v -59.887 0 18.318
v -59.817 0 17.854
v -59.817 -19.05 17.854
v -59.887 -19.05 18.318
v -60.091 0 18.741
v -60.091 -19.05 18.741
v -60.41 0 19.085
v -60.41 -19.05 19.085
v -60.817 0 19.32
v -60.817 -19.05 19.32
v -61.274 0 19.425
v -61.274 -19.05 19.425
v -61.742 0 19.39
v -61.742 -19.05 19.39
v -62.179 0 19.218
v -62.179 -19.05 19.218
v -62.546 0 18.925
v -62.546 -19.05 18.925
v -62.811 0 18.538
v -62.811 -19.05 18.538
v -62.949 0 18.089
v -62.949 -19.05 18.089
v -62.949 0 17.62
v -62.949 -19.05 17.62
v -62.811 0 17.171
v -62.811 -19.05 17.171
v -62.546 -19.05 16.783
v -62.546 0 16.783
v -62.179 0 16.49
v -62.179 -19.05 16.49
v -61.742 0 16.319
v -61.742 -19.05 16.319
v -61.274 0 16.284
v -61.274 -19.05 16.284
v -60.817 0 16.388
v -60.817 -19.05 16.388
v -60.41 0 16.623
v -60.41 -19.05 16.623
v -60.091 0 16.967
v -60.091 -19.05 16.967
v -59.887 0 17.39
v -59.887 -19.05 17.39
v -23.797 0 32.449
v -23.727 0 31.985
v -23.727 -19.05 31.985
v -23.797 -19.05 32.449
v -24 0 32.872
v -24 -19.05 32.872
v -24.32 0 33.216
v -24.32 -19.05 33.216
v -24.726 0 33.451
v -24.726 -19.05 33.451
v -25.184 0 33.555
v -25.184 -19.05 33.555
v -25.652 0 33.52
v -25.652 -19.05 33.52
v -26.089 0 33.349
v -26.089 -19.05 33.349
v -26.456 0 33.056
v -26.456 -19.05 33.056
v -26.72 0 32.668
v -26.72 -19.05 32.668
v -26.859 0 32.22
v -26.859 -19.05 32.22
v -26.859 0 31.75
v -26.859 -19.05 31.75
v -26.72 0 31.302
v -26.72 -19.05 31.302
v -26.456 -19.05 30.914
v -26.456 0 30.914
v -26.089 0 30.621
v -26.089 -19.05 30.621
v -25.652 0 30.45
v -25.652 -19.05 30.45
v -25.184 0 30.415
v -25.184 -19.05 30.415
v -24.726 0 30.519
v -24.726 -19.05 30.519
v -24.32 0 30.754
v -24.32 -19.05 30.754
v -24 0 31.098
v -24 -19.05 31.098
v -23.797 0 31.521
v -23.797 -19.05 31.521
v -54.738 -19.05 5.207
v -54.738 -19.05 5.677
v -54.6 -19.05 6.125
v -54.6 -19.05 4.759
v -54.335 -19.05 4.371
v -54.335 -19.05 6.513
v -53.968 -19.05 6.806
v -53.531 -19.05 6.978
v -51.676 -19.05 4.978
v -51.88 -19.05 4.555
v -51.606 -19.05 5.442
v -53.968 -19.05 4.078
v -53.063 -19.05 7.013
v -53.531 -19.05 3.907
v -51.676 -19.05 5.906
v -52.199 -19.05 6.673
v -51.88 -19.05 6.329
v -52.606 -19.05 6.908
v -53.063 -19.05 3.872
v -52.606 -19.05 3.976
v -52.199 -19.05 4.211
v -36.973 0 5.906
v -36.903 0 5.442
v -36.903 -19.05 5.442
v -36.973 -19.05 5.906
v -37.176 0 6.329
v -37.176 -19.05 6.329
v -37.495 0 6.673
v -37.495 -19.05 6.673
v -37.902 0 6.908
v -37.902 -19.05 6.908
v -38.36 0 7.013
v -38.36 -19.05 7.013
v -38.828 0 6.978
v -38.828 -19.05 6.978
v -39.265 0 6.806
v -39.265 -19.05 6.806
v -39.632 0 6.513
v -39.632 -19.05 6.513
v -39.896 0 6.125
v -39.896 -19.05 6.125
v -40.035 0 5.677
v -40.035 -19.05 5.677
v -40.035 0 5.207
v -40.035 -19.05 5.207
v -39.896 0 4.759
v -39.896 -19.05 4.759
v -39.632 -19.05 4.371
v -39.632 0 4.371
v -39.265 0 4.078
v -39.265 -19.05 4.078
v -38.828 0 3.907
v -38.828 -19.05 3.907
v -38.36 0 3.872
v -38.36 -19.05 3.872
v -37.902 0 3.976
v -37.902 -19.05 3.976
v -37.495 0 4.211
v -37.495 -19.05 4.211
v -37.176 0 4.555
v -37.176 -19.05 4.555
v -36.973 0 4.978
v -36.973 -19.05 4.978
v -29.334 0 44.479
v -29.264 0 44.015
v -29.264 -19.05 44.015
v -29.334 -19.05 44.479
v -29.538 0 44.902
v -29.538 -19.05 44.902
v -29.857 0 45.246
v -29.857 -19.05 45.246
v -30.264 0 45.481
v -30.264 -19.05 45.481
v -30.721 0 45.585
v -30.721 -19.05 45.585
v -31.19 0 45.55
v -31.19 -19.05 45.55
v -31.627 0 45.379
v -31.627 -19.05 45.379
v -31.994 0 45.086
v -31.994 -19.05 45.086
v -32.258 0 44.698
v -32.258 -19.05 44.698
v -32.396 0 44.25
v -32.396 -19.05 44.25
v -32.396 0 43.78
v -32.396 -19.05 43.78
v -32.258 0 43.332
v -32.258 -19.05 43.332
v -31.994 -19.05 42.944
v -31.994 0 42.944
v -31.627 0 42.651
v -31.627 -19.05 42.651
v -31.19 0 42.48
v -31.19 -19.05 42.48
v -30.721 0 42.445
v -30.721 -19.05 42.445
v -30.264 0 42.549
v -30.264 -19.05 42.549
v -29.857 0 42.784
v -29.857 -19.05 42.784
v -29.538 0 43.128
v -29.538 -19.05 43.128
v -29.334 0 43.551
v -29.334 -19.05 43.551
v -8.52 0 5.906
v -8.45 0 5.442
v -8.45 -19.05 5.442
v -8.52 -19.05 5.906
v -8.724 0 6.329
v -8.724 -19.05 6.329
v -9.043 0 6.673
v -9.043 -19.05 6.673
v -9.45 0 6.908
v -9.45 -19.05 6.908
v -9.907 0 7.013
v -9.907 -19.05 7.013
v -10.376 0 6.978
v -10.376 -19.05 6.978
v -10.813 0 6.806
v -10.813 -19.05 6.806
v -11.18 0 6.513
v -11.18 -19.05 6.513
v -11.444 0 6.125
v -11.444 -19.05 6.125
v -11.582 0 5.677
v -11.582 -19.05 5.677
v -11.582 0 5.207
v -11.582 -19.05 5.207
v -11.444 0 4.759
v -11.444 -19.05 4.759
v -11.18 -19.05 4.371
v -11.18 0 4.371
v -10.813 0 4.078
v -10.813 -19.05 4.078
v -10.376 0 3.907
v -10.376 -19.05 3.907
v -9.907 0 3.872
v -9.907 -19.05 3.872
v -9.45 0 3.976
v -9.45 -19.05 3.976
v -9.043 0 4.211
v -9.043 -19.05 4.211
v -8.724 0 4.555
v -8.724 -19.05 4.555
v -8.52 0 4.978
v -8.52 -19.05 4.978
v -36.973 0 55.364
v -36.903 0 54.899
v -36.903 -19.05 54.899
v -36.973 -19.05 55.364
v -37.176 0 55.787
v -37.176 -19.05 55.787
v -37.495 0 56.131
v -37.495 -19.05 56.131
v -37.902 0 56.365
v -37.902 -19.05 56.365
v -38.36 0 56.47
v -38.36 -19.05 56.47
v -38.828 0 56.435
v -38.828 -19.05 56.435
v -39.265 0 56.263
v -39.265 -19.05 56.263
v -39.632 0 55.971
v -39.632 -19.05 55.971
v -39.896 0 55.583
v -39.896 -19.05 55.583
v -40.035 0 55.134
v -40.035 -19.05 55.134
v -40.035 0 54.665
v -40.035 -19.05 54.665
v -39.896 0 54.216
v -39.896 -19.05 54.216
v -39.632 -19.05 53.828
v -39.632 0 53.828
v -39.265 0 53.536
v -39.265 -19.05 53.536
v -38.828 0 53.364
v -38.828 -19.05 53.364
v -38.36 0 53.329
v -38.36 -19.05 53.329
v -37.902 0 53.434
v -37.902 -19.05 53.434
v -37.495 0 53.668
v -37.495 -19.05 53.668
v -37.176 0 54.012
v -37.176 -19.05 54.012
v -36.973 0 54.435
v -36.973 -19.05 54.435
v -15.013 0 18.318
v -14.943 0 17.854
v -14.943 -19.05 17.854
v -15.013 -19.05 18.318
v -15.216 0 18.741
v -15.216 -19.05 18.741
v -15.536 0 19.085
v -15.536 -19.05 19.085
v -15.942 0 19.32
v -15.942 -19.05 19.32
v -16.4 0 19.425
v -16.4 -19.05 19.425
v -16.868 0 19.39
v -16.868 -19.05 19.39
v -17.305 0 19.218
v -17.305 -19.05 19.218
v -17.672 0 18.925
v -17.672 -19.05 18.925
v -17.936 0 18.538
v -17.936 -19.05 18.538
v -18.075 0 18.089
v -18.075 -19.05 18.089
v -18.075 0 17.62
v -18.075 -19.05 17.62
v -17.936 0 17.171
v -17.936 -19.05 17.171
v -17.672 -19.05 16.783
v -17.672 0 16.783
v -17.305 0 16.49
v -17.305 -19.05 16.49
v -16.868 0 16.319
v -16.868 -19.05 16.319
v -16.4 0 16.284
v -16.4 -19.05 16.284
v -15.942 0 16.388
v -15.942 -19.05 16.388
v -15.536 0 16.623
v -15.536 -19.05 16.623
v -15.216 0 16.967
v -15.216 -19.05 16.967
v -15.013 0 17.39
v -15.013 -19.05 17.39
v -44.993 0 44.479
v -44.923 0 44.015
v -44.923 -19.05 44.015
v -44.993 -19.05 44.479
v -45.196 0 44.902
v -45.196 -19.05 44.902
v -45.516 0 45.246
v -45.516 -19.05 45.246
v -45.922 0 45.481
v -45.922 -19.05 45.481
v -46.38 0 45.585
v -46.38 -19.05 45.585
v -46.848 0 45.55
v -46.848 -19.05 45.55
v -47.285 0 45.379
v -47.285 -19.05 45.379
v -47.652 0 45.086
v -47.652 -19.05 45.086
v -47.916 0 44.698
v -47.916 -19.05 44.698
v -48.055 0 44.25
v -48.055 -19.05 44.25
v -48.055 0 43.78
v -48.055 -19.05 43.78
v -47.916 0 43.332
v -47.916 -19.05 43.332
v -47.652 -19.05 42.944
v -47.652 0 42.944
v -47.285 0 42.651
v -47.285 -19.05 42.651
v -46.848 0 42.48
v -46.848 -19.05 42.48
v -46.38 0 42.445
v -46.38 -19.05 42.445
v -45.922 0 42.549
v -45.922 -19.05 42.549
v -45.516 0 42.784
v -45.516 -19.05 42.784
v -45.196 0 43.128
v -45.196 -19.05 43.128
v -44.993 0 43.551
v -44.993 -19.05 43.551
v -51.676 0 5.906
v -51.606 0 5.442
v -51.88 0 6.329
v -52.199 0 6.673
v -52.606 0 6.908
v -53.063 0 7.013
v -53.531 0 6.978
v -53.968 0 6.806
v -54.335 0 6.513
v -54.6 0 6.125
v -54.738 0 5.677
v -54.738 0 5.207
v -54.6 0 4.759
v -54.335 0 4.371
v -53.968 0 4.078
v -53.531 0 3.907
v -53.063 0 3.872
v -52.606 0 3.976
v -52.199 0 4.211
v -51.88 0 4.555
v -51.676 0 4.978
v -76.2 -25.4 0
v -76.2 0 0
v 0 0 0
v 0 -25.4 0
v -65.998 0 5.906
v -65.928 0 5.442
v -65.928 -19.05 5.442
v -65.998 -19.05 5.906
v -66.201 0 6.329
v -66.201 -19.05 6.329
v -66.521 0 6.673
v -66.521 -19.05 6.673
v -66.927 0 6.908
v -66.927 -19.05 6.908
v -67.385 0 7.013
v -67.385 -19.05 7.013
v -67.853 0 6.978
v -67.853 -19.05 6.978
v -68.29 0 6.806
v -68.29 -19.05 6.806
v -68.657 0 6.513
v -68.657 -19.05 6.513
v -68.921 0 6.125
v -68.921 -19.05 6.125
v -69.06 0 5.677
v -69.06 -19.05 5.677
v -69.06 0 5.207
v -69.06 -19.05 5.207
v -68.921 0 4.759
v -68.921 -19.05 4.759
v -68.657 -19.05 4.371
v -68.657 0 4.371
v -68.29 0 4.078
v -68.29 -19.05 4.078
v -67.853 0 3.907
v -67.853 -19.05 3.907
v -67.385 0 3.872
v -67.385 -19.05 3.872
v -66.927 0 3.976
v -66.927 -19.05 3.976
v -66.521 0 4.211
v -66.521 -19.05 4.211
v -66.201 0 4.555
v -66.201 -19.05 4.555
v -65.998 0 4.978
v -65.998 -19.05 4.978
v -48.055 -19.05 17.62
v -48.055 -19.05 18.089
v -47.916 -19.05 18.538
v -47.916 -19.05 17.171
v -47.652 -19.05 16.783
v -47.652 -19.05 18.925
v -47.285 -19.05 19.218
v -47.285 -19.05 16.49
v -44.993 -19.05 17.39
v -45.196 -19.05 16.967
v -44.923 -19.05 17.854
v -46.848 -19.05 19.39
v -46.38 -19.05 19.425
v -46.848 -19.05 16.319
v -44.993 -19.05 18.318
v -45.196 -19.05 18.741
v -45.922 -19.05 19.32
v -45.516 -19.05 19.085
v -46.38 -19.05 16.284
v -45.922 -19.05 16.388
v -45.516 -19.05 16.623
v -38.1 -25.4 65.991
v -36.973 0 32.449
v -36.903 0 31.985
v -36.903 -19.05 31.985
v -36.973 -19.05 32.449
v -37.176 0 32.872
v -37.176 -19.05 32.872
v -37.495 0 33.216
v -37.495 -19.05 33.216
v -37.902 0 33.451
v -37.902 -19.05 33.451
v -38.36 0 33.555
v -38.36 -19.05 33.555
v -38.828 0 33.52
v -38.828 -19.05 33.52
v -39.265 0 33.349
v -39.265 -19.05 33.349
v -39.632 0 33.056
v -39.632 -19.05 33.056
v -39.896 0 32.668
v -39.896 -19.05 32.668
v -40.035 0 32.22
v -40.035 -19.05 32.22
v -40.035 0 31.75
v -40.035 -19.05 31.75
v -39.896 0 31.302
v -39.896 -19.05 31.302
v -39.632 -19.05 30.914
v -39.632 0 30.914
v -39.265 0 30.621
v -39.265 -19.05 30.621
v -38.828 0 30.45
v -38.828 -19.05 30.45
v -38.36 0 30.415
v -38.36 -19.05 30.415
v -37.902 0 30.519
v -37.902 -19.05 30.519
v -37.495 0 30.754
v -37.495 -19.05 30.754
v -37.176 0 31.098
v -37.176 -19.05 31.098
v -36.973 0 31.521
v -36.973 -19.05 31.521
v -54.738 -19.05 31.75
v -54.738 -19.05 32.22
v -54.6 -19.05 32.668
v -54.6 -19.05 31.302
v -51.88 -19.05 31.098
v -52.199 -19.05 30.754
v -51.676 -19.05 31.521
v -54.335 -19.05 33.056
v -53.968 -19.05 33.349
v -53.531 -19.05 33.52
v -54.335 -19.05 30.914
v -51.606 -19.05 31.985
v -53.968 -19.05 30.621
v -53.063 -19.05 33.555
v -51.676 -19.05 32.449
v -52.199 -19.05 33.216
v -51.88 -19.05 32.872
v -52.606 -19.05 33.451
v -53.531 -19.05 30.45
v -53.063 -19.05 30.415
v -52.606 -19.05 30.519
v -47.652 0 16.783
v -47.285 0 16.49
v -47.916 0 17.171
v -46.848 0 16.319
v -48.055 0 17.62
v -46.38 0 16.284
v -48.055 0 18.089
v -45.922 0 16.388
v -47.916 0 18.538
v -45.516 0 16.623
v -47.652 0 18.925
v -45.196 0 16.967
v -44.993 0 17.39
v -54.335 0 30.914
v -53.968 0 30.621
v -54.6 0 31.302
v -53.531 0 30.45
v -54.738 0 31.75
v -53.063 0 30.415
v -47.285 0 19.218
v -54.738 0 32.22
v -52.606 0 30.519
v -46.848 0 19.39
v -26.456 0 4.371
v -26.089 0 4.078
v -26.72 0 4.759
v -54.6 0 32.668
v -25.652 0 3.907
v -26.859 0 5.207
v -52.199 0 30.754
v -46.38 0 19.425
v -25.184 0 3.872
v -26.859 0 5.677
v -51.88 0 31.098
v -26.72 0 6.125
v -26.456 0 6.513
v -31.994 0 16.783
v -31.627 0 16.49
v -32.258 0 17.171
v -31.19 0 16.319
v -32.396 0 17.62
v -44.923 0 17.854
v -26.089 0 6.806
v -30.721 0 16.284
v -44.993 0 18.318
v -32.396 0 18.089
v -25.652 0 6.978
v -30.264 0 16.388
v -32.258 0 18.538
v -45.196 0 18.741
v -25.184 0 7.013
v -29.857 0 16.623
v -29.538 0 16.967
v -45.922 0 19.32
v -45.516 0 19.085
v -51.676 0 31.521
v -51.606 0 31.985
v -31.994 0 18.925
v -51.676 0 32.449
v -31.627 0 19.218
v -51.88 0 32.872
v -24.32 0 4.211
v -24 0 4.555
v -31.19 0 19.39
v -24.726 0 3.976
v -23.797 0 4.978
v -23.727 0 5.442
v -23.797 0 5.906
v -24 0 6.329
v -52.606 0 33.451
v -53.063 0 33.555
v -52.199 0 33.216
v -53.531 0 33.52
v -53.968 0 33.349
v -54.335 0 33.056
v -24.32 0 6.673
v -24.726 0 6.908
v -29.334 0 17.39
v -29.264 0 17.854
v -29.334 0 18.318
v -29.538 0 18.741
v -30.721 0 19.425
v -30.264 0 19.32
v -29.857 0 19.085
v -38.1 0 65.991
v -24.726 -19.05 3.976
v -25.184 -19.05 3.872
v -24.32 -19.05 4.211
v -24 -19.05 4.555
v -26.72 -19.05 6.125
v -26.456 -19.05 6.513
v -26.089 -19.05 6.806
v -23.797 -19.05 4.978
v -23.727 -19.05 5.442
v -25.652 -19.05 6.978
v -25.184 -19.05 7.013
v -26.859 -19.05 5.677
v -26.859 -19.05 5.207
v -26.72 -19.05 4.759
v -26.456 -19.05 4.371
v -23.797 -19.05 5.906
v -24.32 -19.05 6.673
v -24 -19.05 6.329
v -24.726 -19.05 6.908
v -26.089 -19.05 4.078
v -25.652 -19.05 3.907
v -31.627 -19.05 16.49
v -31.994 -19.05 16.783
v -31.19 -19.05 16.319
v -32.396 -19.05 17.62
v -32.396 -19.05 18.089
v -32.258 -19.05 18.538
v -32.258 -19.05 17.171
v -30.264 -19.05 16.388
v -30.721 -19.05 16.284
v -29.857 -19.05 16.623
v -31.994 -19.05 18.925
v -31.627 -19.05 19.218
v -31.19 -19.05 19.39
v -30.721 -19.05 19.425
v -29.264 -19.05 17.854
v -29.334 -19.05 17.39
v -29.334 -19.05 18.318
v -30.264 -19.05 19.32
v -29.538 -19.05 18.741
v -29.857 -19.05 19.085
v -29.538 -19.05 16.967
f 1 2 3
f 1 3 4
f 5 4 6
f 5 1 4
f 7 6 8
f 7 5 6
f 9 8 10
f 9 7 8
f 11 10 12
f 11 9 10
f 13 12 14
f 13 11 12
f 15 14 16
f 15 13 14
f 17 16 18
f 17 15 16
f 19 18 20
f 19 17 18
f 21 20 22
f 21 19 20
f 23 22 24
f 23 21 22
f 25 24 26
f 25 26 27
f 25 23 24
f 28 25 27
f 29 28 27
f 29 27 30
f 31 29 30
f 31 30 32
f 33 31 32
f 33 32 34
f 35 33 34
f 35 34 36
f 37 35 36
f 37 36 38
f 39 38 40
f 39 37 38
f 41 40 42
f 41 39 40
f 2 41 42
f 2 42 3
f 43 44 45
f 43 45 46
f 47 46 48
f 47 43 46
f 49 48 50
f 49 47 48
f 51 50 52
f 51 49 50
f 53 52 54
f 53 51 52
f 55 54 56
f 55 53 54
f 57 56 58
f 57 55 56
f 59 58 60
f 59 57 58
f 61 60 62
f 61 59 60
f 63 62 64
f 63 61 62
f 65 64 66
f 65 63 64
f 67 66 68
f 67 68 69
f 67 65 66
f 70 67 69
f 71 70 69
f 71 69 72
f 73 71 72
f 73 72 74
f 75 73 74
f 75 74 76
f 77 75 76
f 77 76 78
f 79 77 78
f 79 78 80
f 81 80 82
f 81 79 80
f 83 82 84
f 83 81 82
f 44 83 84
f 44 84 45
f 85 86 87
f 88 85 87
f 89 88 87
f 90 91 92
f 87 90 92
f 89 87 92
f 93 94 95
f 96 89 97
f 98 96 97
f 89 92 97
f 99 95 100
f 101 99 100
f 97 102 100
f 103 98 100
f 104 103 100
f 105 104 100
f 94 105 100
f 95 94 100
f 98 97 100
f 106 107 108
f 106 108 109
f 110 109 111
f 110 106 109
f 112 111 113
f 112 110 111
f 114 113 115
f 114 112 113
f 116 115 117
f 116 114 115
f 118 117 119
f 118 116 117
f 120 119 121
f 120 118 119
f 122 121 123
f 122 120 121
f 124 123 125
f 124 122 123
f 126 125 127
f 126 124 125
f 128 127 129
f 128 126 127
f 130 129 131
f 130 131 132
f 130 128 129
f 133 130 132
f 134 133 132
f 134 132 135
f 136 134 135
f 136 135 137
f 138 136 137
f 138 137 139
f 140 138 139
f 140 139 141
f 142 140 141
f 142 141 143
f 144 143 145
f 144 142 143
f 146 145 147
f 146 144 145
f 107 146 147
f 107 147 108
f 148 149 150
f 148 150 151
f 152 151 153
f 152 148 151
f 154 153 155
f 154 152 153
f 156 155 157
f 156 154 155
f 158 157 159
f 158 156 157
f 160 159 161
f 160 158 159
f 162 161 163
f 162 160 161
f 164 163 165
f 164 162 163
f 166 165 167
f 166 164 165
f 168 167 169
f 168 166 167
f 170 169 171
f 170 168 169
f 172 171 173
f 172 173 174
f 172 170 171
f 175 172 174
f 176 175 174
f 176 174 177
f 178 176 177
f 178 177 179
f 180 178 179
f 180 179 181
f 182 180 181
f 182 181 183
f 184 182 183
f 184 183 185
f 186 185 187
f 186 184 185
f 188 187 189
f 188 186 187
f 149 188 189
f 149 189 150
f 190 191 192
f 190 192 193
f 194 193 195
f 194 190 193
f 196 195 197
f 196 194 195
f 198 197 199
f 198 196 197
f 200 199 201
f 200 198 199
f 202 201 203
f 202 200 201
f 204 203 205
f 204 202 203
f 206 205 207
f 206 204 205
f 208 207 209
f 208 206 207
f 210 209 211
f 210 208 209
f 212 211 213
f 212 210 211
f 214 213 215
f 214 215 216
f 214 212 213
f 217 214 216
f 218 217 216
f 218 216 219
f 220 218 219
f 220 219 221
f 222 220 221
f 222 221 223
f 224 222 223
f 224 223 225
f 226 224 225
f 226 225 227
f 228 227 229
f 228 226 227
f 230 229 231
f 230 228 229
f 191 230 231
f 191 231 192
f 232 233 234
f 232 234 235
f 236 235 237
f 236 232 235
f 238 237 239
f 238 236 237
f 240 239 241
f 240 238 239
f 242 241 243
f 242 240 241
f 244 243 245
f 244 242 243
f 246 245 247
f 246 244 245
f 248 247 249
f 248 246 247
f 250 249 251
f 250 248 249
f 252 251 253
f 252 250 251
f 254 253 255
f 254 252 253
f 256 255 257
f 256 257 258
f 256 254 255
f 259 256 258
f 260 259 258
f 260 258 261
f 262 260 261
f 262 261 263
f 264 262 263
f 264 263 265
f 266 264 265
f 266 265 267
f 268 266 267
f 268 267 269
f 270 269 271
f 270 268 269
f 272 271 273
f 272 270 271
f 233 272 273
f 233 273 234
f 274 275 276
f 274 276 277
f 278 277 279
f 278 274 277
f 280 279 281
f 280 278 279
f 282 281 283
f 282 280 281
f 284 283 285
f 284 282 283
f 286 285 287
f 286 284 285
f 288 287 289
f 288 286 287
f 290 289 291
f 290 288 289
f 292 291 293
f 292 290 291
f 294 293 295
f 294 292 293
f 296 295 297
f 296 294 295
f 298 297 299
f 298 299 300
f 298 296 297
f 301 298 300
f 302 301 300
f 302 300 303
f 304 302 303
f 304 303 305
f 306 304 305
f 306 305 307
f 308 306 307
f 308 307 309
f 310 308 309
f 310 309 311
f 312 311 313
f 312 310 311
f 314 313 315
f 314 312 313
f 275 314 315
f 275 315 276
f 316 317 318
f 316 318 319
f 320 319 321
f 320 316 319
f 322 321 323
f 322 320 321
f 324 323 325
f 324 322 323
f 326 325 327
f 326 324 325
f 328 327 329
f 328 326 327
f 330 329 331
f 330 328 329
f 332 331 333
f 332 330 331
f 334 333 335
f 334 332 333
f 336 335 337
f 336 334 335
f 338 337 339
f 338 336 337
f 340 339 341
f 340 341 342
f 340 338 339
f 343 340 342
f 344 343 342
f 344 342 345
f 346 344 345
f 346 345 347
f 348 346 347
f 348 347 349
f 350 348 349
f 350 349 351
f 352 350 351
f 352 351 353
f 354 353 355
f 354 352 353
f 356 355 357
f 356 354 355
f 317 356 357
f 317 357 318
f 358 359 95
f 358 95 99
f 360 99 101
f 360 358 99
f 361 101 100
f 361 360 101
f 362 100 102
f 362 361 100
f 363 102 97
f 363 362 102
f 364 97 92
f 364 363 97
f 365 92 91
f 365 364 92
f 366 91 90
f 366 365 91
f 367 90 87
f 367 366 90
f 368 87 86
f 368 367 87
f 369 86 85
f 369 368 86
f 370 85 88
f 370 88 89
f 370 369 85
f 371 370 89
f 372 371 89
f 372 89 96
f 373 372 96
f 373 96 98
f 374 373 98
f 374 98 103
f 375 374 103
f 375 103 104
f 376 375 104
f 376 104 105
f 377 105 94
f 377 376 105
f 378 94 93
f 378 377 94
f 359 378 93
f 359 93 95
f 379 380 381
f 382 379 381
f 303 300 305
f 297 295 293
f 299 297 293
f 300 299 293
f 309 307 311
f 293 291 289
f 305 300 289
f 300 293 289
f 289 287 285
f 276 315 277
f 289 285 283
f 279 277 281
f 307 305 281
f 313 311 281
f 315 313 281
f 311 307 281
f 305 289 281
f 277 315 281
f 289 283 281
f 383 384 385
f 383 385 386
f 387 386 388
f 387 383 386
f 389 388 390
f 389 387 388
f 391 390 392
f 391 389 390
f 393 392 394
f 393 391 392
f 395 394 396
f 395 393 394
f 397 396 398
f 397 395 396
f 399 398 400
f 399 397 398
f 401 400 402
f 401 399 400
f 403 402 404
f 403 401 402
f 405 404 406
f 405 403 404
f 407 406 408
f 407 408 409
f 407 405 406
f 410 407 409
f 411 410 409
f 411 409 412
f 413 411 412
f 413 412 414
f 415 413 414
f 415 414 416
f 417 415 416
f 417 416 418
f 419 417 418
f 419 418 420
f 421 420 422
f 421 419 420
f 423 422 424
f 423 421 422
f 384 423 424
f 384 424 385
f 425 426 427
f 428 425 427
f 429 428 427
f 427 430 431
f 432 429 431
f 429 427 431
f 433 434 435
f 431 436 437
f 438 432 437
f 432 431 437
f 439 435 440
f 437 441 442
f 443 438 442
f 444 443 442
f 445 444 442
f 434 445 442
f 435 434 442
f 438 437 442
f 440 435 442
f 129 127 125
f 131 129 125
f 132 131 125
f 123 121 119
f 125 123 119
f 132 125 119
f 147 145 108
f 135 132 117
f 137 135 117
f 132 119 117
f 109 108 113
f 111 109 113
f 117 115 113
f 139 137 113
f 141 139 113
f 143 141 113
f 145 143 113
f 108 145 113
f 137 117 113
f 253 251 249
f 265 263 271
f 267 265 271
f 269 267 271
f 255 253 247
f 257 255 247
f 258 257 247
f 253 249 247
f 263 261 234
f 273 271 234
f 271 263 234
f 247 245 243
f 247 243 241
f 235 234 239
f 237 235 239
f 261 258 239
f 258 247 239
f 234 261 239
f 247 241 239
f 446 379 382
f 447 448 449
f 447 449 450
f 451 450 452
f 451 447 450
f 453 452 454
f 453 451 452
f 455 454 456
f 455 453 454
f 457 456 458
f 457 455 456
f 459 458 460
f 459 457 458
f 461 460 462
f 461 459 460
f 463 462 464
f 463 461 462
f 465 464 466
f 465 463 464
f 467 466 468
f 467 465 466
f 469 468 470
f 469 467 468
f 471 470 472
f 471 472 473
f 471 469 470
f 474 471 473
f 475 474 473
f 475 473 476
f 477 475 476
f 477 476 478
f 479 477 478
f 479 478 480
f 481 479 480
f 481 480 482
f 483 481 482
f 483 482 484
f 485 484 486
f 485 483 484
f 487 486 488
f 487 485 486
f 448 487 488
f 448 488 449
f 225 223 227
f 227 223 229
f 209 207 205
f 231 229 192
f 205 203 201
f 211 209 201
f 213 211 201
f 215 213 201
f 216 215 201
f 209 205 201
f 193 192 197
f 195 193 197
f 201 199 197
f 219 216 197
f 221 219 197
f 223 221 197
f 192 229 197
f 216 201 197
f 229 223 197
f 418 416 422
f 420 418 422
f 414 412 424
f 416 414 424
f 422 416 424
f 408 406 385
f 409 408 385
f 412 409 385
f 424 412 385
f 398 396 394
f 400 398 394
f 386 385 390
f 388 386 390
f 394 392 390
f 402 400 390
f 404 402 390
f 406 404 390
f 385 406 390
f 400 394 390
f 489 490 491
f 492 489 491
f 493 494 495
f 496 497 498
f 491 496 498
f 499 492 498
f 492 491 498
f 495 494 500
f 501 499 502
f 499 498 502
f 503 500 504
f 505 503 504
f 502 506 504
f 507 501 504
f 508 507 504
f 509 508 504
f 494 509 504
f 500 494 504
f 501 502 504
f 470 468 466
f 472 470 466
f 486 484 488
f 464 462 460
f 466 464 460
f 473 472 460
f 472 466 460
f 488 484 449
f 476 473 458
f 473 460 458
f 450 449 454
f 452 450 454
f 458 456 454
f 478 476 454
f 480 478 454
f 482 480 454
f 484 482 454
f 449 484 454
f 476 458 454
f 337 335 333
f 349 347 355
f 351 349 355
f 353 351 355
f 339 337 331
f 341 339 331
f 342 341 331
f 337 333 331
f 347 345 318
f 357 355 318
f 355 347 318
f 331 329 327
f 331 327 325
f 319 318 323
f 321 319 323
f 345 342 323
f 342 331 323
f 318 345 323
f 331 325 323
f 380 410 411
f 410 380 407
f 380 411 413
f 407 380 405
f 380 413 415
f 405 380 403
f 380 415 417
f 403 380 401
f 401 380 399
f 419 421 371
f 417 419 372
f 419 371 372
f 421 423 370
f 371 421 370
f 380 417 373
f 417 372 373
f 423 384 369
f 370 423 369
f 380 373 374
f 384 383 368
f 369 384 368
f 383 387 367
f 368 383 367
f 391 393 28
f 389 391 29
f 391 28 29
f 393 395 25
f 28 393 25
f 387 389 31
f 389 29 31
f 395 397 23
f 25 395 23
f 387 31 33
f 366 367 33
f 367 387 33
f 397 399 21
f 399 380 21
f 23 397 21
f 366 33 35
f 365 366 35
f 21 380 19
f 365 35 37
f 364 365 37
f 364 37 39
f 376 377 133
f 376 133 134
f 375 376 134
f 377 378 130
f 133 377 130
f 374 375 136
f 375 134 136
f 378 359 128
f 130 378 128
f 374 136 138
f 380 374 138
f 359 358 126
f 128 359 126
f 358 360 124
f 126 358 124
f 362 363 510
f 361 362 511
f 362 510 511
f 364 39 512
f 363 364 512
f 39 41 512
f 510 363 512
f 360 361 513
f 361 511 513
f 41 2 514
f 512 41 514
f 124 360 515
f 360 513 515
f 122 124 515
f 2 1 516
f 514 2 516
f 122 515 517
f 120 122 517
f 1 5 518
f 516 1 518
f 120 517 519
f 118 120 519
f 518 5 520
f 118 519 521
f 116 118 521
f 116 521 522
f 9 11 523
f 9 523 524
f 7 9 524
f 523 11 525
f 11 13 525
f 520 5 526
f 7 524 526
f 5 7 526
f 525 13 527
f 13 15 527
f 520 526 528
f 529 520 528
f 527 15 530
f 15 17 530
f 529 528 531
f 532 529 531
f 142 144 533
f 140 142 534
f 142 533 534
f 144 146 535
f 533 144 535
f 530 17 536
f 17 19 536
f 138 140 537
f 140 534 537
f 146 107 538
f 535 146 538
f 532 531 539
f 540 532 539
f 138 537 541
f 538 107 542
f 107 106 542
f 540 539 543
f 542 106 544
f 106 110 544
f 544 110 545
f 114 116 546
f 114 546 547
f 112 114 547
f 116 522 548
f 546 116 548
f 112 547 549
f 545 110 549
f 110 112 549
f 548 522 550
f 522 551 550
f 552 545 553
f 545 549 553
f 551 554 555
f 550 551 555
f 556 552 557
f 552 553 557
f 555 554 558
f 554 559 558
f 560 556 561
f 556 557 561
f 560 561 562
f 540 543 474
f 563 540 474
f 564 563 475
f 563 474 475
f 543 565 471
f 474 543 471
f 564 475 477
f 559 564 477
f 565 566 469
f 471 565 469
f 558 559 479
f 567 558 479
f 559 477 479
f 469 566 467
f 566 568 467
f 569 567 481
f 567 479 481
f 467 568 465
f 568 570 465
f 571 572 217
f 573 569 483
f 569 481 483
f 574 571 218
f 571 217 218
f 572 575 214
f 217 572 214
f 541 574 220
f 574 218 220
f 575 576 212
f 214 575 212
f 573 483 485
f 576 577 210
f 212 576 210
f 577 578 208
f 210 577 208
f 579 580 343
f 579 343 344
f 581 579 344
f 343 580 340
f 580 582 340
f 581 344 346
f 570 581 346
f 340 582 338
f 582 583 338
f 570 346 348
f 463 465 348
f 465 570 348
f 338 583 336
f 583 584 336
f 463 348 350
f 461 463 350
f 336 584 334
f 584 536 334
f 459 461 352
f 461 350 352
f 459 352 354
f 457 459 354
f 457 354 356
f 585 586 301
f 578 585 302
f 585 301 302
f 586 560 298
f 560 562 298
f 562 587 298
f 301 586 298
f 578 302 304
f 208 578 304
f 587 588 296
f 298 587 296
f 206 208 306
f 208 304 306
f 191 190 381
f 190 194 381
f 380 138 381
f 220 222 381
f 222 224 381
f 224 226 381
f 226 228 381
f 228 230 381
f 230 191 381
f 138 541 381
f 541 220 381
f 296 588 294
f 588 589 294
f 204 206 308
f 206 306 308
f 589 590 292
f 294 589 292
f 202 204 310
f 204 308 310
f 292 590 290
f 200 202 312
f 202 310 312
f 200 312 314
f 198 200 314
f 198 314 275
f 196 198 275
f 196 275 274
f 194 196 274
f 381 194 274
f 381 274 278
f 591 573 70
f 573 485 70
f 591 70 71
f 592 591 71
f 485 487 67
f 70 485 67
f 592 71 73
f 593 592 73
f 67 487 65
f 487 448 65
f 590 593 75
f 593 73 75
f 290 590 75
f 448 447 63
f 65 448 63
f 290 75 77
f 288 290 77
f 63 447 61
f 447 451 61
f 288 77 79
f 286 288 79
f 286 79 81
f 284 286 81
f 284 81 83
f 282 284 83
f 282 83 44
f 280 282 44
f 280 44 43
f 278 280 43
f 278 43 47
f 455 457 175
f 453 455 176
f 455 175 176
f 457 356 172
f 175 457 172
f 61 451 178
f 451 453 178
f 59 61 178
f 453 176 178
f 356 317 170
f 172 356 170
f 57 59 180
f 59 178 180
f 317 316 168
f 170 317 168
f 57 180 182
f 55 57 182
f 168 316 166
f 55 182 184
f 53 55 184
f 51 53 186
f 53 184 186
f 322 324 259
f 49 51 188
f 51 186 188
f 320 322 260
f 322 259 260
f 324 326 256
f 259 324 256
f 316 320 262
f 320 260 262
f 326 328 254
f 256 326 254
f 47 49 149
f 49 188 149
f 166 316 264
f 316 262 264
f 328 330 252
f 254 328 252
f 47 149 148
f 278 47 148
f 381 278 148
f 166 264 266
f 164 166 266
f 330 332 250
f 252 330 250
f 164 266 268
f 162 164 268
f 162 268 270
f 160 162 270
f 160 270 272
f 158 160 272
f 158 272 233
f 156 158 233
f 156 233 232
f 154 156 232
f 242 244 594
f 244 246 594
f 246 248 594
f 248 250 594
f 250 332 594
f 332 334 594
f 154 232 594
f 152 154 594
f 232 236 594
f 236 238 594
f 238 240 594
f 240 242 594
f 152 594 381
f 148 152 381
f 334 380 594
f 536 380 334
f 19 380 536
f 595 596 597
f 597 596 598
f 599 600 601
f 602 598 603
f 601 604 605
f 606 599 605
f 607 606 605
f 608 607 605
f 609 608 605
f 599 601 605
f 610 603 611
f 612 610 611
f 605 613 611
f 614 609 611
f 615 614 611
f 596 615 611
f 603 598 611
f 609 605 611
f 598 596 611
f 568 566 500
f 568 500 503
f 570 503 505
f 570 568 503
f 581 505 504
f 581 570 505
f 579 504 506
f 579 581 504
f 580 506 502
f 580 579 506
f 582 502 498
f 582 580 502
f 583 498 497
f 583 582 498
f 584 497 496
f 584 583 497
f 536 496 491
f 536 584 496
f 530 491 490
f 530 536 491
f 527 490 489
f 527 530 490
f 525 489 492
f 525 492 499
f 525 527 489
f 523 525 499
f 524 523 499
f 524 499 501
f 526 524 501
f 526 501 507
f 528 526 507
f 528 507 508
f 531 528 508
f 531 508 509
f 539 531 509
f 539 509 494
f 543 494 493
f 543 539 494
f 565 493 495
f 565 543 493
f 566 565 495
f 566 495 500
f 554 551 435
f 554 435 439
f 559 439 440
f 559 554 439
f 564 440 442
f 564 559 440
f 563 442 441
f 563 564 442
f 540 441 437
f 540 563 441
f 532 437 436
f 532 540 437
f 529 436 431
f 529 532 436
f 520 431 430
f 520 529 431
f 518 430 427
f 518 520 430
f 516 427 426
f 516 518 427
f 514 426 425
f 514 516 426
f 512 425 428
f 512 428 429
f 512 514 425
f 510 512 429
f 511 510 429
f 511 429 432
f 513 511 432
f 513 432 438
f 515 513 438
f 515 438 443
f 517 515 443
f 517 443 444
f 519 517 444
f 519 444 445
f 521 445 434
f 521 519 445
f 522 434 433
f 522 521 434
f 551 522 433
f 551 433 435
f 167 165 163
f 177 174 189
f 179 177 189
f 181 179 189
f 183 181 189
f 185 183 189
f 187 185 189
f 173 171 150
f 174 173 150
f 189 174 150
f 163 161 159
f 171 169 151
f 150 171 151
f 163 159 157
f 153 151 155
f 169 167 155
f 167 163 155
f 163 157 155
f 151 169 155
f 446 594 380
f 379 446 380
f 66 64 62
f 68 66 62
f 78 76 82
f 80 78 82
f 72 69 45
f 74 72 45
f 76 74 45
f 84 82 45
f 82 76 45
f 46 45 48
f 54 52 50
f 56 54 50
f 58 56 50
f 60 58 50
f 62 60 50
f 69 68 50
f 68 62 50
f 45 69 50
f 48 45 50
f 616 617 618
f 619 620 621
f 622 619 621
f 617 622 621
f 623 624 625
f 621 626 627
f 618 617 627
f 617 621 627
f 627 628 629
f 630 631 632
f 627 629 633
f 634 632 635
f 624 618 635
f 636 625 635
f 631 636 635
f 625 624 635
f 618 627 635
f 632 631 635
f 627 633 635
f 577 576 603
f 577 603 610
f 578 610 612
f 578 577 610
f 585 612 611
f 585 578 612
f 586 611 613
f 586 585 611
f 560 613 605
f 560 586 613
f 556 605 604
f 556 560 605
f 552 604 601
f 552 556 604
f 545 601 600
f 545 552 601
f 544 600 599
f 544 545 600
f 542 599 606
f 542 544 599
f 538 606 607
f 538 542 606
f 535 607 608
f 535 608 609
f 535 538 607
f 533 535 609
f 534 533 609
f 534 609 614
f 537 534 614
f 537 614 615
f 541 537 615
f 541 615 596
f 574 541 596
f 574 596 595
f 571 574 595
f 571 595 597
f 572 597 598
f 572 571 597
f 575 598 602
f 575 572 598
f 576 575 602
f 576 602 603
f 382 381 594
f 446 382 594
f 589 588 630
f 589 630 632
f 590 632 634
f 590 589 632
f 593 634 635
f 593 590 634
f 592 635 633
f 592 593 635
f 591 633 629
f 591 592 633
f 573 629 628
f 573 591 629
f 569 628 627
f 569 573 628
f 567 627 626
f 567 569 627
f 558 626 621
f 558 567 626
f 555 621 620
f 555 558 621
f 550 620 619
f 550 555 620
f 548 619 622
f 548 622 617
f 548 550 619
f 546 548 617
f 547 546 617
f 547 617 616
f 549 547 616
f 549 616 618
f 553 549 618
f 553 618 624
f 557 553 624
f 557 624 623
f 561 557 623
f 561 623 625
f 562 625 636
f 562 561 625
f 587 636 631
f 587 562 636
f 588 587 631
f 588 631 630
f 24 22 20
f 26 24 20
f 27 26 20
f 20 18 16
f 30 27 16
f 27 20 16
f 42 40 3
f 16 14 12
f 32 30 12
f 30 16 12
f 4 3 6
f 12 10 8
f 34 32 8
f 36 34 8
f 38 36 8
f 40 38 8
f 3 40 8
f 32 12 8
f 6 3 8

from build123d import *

# Parameters (mm, degrees)
F1_DEPTH = 25.4
F2_R     = 1.5748
F3_DEPTH = 19.05


with BuildPart() as f1:
    # F0 (on Front) → F1 (new body)
    with BuildSketch(Plane.XZ):
        Polygon((-76.2, 0), (0, 0), (-38.1, 65.991136), align=None)
    extrude(amount=F1_DEPTH)

    # F2 (on Front) → F3 (cut)
    with BuildSketch(Plane.XZ):
        with Locations((-38.477365, 54.899465)):
            Circle(F2_R)
        with Locations((-46.49746, 44.01505)):
            Circle(F2_R)
        with Locations((-53.180873, 31.984907)):
            Circle(F2_R)
        with Locations((-61.391924, 17.85426)):
            Circle(F2_R)
        with Locations((-67.502469, 5.442208)):
            Circle(F2_R)
        with Locations((-30.839177, 44.01505)):
            Circle(F2_R)
        with Locations((-38.477365, 31.984907)):
            Circle(F2_R)
        with Locations((-25.301492, 31.984907)):
            Circle(F2_R)
        with Locations((-46.49746, 17.85426)):
            Circle(F2_R)
        with Locations((-30.839177, 17.85426)):
            Circle(F2_R)
        with Locations((-16.517578, 17.85426)):
            Circle(F2_R)
        with Locations((-38.477365, 5.442208)):
            Circle(F2_R)
        with Locations((-53.180873, 5.442208)):
            Circle(F2_R)
        with Locations((-25.301492, 5.442208)):
            Circle(F2_R)
        with Locations((-10.025119, 5.442208)):
            Circle(F2_R)
    extrude(amount=F3_DEPTH, mode=Mode.SUBTRACT)


solid = f1.part
